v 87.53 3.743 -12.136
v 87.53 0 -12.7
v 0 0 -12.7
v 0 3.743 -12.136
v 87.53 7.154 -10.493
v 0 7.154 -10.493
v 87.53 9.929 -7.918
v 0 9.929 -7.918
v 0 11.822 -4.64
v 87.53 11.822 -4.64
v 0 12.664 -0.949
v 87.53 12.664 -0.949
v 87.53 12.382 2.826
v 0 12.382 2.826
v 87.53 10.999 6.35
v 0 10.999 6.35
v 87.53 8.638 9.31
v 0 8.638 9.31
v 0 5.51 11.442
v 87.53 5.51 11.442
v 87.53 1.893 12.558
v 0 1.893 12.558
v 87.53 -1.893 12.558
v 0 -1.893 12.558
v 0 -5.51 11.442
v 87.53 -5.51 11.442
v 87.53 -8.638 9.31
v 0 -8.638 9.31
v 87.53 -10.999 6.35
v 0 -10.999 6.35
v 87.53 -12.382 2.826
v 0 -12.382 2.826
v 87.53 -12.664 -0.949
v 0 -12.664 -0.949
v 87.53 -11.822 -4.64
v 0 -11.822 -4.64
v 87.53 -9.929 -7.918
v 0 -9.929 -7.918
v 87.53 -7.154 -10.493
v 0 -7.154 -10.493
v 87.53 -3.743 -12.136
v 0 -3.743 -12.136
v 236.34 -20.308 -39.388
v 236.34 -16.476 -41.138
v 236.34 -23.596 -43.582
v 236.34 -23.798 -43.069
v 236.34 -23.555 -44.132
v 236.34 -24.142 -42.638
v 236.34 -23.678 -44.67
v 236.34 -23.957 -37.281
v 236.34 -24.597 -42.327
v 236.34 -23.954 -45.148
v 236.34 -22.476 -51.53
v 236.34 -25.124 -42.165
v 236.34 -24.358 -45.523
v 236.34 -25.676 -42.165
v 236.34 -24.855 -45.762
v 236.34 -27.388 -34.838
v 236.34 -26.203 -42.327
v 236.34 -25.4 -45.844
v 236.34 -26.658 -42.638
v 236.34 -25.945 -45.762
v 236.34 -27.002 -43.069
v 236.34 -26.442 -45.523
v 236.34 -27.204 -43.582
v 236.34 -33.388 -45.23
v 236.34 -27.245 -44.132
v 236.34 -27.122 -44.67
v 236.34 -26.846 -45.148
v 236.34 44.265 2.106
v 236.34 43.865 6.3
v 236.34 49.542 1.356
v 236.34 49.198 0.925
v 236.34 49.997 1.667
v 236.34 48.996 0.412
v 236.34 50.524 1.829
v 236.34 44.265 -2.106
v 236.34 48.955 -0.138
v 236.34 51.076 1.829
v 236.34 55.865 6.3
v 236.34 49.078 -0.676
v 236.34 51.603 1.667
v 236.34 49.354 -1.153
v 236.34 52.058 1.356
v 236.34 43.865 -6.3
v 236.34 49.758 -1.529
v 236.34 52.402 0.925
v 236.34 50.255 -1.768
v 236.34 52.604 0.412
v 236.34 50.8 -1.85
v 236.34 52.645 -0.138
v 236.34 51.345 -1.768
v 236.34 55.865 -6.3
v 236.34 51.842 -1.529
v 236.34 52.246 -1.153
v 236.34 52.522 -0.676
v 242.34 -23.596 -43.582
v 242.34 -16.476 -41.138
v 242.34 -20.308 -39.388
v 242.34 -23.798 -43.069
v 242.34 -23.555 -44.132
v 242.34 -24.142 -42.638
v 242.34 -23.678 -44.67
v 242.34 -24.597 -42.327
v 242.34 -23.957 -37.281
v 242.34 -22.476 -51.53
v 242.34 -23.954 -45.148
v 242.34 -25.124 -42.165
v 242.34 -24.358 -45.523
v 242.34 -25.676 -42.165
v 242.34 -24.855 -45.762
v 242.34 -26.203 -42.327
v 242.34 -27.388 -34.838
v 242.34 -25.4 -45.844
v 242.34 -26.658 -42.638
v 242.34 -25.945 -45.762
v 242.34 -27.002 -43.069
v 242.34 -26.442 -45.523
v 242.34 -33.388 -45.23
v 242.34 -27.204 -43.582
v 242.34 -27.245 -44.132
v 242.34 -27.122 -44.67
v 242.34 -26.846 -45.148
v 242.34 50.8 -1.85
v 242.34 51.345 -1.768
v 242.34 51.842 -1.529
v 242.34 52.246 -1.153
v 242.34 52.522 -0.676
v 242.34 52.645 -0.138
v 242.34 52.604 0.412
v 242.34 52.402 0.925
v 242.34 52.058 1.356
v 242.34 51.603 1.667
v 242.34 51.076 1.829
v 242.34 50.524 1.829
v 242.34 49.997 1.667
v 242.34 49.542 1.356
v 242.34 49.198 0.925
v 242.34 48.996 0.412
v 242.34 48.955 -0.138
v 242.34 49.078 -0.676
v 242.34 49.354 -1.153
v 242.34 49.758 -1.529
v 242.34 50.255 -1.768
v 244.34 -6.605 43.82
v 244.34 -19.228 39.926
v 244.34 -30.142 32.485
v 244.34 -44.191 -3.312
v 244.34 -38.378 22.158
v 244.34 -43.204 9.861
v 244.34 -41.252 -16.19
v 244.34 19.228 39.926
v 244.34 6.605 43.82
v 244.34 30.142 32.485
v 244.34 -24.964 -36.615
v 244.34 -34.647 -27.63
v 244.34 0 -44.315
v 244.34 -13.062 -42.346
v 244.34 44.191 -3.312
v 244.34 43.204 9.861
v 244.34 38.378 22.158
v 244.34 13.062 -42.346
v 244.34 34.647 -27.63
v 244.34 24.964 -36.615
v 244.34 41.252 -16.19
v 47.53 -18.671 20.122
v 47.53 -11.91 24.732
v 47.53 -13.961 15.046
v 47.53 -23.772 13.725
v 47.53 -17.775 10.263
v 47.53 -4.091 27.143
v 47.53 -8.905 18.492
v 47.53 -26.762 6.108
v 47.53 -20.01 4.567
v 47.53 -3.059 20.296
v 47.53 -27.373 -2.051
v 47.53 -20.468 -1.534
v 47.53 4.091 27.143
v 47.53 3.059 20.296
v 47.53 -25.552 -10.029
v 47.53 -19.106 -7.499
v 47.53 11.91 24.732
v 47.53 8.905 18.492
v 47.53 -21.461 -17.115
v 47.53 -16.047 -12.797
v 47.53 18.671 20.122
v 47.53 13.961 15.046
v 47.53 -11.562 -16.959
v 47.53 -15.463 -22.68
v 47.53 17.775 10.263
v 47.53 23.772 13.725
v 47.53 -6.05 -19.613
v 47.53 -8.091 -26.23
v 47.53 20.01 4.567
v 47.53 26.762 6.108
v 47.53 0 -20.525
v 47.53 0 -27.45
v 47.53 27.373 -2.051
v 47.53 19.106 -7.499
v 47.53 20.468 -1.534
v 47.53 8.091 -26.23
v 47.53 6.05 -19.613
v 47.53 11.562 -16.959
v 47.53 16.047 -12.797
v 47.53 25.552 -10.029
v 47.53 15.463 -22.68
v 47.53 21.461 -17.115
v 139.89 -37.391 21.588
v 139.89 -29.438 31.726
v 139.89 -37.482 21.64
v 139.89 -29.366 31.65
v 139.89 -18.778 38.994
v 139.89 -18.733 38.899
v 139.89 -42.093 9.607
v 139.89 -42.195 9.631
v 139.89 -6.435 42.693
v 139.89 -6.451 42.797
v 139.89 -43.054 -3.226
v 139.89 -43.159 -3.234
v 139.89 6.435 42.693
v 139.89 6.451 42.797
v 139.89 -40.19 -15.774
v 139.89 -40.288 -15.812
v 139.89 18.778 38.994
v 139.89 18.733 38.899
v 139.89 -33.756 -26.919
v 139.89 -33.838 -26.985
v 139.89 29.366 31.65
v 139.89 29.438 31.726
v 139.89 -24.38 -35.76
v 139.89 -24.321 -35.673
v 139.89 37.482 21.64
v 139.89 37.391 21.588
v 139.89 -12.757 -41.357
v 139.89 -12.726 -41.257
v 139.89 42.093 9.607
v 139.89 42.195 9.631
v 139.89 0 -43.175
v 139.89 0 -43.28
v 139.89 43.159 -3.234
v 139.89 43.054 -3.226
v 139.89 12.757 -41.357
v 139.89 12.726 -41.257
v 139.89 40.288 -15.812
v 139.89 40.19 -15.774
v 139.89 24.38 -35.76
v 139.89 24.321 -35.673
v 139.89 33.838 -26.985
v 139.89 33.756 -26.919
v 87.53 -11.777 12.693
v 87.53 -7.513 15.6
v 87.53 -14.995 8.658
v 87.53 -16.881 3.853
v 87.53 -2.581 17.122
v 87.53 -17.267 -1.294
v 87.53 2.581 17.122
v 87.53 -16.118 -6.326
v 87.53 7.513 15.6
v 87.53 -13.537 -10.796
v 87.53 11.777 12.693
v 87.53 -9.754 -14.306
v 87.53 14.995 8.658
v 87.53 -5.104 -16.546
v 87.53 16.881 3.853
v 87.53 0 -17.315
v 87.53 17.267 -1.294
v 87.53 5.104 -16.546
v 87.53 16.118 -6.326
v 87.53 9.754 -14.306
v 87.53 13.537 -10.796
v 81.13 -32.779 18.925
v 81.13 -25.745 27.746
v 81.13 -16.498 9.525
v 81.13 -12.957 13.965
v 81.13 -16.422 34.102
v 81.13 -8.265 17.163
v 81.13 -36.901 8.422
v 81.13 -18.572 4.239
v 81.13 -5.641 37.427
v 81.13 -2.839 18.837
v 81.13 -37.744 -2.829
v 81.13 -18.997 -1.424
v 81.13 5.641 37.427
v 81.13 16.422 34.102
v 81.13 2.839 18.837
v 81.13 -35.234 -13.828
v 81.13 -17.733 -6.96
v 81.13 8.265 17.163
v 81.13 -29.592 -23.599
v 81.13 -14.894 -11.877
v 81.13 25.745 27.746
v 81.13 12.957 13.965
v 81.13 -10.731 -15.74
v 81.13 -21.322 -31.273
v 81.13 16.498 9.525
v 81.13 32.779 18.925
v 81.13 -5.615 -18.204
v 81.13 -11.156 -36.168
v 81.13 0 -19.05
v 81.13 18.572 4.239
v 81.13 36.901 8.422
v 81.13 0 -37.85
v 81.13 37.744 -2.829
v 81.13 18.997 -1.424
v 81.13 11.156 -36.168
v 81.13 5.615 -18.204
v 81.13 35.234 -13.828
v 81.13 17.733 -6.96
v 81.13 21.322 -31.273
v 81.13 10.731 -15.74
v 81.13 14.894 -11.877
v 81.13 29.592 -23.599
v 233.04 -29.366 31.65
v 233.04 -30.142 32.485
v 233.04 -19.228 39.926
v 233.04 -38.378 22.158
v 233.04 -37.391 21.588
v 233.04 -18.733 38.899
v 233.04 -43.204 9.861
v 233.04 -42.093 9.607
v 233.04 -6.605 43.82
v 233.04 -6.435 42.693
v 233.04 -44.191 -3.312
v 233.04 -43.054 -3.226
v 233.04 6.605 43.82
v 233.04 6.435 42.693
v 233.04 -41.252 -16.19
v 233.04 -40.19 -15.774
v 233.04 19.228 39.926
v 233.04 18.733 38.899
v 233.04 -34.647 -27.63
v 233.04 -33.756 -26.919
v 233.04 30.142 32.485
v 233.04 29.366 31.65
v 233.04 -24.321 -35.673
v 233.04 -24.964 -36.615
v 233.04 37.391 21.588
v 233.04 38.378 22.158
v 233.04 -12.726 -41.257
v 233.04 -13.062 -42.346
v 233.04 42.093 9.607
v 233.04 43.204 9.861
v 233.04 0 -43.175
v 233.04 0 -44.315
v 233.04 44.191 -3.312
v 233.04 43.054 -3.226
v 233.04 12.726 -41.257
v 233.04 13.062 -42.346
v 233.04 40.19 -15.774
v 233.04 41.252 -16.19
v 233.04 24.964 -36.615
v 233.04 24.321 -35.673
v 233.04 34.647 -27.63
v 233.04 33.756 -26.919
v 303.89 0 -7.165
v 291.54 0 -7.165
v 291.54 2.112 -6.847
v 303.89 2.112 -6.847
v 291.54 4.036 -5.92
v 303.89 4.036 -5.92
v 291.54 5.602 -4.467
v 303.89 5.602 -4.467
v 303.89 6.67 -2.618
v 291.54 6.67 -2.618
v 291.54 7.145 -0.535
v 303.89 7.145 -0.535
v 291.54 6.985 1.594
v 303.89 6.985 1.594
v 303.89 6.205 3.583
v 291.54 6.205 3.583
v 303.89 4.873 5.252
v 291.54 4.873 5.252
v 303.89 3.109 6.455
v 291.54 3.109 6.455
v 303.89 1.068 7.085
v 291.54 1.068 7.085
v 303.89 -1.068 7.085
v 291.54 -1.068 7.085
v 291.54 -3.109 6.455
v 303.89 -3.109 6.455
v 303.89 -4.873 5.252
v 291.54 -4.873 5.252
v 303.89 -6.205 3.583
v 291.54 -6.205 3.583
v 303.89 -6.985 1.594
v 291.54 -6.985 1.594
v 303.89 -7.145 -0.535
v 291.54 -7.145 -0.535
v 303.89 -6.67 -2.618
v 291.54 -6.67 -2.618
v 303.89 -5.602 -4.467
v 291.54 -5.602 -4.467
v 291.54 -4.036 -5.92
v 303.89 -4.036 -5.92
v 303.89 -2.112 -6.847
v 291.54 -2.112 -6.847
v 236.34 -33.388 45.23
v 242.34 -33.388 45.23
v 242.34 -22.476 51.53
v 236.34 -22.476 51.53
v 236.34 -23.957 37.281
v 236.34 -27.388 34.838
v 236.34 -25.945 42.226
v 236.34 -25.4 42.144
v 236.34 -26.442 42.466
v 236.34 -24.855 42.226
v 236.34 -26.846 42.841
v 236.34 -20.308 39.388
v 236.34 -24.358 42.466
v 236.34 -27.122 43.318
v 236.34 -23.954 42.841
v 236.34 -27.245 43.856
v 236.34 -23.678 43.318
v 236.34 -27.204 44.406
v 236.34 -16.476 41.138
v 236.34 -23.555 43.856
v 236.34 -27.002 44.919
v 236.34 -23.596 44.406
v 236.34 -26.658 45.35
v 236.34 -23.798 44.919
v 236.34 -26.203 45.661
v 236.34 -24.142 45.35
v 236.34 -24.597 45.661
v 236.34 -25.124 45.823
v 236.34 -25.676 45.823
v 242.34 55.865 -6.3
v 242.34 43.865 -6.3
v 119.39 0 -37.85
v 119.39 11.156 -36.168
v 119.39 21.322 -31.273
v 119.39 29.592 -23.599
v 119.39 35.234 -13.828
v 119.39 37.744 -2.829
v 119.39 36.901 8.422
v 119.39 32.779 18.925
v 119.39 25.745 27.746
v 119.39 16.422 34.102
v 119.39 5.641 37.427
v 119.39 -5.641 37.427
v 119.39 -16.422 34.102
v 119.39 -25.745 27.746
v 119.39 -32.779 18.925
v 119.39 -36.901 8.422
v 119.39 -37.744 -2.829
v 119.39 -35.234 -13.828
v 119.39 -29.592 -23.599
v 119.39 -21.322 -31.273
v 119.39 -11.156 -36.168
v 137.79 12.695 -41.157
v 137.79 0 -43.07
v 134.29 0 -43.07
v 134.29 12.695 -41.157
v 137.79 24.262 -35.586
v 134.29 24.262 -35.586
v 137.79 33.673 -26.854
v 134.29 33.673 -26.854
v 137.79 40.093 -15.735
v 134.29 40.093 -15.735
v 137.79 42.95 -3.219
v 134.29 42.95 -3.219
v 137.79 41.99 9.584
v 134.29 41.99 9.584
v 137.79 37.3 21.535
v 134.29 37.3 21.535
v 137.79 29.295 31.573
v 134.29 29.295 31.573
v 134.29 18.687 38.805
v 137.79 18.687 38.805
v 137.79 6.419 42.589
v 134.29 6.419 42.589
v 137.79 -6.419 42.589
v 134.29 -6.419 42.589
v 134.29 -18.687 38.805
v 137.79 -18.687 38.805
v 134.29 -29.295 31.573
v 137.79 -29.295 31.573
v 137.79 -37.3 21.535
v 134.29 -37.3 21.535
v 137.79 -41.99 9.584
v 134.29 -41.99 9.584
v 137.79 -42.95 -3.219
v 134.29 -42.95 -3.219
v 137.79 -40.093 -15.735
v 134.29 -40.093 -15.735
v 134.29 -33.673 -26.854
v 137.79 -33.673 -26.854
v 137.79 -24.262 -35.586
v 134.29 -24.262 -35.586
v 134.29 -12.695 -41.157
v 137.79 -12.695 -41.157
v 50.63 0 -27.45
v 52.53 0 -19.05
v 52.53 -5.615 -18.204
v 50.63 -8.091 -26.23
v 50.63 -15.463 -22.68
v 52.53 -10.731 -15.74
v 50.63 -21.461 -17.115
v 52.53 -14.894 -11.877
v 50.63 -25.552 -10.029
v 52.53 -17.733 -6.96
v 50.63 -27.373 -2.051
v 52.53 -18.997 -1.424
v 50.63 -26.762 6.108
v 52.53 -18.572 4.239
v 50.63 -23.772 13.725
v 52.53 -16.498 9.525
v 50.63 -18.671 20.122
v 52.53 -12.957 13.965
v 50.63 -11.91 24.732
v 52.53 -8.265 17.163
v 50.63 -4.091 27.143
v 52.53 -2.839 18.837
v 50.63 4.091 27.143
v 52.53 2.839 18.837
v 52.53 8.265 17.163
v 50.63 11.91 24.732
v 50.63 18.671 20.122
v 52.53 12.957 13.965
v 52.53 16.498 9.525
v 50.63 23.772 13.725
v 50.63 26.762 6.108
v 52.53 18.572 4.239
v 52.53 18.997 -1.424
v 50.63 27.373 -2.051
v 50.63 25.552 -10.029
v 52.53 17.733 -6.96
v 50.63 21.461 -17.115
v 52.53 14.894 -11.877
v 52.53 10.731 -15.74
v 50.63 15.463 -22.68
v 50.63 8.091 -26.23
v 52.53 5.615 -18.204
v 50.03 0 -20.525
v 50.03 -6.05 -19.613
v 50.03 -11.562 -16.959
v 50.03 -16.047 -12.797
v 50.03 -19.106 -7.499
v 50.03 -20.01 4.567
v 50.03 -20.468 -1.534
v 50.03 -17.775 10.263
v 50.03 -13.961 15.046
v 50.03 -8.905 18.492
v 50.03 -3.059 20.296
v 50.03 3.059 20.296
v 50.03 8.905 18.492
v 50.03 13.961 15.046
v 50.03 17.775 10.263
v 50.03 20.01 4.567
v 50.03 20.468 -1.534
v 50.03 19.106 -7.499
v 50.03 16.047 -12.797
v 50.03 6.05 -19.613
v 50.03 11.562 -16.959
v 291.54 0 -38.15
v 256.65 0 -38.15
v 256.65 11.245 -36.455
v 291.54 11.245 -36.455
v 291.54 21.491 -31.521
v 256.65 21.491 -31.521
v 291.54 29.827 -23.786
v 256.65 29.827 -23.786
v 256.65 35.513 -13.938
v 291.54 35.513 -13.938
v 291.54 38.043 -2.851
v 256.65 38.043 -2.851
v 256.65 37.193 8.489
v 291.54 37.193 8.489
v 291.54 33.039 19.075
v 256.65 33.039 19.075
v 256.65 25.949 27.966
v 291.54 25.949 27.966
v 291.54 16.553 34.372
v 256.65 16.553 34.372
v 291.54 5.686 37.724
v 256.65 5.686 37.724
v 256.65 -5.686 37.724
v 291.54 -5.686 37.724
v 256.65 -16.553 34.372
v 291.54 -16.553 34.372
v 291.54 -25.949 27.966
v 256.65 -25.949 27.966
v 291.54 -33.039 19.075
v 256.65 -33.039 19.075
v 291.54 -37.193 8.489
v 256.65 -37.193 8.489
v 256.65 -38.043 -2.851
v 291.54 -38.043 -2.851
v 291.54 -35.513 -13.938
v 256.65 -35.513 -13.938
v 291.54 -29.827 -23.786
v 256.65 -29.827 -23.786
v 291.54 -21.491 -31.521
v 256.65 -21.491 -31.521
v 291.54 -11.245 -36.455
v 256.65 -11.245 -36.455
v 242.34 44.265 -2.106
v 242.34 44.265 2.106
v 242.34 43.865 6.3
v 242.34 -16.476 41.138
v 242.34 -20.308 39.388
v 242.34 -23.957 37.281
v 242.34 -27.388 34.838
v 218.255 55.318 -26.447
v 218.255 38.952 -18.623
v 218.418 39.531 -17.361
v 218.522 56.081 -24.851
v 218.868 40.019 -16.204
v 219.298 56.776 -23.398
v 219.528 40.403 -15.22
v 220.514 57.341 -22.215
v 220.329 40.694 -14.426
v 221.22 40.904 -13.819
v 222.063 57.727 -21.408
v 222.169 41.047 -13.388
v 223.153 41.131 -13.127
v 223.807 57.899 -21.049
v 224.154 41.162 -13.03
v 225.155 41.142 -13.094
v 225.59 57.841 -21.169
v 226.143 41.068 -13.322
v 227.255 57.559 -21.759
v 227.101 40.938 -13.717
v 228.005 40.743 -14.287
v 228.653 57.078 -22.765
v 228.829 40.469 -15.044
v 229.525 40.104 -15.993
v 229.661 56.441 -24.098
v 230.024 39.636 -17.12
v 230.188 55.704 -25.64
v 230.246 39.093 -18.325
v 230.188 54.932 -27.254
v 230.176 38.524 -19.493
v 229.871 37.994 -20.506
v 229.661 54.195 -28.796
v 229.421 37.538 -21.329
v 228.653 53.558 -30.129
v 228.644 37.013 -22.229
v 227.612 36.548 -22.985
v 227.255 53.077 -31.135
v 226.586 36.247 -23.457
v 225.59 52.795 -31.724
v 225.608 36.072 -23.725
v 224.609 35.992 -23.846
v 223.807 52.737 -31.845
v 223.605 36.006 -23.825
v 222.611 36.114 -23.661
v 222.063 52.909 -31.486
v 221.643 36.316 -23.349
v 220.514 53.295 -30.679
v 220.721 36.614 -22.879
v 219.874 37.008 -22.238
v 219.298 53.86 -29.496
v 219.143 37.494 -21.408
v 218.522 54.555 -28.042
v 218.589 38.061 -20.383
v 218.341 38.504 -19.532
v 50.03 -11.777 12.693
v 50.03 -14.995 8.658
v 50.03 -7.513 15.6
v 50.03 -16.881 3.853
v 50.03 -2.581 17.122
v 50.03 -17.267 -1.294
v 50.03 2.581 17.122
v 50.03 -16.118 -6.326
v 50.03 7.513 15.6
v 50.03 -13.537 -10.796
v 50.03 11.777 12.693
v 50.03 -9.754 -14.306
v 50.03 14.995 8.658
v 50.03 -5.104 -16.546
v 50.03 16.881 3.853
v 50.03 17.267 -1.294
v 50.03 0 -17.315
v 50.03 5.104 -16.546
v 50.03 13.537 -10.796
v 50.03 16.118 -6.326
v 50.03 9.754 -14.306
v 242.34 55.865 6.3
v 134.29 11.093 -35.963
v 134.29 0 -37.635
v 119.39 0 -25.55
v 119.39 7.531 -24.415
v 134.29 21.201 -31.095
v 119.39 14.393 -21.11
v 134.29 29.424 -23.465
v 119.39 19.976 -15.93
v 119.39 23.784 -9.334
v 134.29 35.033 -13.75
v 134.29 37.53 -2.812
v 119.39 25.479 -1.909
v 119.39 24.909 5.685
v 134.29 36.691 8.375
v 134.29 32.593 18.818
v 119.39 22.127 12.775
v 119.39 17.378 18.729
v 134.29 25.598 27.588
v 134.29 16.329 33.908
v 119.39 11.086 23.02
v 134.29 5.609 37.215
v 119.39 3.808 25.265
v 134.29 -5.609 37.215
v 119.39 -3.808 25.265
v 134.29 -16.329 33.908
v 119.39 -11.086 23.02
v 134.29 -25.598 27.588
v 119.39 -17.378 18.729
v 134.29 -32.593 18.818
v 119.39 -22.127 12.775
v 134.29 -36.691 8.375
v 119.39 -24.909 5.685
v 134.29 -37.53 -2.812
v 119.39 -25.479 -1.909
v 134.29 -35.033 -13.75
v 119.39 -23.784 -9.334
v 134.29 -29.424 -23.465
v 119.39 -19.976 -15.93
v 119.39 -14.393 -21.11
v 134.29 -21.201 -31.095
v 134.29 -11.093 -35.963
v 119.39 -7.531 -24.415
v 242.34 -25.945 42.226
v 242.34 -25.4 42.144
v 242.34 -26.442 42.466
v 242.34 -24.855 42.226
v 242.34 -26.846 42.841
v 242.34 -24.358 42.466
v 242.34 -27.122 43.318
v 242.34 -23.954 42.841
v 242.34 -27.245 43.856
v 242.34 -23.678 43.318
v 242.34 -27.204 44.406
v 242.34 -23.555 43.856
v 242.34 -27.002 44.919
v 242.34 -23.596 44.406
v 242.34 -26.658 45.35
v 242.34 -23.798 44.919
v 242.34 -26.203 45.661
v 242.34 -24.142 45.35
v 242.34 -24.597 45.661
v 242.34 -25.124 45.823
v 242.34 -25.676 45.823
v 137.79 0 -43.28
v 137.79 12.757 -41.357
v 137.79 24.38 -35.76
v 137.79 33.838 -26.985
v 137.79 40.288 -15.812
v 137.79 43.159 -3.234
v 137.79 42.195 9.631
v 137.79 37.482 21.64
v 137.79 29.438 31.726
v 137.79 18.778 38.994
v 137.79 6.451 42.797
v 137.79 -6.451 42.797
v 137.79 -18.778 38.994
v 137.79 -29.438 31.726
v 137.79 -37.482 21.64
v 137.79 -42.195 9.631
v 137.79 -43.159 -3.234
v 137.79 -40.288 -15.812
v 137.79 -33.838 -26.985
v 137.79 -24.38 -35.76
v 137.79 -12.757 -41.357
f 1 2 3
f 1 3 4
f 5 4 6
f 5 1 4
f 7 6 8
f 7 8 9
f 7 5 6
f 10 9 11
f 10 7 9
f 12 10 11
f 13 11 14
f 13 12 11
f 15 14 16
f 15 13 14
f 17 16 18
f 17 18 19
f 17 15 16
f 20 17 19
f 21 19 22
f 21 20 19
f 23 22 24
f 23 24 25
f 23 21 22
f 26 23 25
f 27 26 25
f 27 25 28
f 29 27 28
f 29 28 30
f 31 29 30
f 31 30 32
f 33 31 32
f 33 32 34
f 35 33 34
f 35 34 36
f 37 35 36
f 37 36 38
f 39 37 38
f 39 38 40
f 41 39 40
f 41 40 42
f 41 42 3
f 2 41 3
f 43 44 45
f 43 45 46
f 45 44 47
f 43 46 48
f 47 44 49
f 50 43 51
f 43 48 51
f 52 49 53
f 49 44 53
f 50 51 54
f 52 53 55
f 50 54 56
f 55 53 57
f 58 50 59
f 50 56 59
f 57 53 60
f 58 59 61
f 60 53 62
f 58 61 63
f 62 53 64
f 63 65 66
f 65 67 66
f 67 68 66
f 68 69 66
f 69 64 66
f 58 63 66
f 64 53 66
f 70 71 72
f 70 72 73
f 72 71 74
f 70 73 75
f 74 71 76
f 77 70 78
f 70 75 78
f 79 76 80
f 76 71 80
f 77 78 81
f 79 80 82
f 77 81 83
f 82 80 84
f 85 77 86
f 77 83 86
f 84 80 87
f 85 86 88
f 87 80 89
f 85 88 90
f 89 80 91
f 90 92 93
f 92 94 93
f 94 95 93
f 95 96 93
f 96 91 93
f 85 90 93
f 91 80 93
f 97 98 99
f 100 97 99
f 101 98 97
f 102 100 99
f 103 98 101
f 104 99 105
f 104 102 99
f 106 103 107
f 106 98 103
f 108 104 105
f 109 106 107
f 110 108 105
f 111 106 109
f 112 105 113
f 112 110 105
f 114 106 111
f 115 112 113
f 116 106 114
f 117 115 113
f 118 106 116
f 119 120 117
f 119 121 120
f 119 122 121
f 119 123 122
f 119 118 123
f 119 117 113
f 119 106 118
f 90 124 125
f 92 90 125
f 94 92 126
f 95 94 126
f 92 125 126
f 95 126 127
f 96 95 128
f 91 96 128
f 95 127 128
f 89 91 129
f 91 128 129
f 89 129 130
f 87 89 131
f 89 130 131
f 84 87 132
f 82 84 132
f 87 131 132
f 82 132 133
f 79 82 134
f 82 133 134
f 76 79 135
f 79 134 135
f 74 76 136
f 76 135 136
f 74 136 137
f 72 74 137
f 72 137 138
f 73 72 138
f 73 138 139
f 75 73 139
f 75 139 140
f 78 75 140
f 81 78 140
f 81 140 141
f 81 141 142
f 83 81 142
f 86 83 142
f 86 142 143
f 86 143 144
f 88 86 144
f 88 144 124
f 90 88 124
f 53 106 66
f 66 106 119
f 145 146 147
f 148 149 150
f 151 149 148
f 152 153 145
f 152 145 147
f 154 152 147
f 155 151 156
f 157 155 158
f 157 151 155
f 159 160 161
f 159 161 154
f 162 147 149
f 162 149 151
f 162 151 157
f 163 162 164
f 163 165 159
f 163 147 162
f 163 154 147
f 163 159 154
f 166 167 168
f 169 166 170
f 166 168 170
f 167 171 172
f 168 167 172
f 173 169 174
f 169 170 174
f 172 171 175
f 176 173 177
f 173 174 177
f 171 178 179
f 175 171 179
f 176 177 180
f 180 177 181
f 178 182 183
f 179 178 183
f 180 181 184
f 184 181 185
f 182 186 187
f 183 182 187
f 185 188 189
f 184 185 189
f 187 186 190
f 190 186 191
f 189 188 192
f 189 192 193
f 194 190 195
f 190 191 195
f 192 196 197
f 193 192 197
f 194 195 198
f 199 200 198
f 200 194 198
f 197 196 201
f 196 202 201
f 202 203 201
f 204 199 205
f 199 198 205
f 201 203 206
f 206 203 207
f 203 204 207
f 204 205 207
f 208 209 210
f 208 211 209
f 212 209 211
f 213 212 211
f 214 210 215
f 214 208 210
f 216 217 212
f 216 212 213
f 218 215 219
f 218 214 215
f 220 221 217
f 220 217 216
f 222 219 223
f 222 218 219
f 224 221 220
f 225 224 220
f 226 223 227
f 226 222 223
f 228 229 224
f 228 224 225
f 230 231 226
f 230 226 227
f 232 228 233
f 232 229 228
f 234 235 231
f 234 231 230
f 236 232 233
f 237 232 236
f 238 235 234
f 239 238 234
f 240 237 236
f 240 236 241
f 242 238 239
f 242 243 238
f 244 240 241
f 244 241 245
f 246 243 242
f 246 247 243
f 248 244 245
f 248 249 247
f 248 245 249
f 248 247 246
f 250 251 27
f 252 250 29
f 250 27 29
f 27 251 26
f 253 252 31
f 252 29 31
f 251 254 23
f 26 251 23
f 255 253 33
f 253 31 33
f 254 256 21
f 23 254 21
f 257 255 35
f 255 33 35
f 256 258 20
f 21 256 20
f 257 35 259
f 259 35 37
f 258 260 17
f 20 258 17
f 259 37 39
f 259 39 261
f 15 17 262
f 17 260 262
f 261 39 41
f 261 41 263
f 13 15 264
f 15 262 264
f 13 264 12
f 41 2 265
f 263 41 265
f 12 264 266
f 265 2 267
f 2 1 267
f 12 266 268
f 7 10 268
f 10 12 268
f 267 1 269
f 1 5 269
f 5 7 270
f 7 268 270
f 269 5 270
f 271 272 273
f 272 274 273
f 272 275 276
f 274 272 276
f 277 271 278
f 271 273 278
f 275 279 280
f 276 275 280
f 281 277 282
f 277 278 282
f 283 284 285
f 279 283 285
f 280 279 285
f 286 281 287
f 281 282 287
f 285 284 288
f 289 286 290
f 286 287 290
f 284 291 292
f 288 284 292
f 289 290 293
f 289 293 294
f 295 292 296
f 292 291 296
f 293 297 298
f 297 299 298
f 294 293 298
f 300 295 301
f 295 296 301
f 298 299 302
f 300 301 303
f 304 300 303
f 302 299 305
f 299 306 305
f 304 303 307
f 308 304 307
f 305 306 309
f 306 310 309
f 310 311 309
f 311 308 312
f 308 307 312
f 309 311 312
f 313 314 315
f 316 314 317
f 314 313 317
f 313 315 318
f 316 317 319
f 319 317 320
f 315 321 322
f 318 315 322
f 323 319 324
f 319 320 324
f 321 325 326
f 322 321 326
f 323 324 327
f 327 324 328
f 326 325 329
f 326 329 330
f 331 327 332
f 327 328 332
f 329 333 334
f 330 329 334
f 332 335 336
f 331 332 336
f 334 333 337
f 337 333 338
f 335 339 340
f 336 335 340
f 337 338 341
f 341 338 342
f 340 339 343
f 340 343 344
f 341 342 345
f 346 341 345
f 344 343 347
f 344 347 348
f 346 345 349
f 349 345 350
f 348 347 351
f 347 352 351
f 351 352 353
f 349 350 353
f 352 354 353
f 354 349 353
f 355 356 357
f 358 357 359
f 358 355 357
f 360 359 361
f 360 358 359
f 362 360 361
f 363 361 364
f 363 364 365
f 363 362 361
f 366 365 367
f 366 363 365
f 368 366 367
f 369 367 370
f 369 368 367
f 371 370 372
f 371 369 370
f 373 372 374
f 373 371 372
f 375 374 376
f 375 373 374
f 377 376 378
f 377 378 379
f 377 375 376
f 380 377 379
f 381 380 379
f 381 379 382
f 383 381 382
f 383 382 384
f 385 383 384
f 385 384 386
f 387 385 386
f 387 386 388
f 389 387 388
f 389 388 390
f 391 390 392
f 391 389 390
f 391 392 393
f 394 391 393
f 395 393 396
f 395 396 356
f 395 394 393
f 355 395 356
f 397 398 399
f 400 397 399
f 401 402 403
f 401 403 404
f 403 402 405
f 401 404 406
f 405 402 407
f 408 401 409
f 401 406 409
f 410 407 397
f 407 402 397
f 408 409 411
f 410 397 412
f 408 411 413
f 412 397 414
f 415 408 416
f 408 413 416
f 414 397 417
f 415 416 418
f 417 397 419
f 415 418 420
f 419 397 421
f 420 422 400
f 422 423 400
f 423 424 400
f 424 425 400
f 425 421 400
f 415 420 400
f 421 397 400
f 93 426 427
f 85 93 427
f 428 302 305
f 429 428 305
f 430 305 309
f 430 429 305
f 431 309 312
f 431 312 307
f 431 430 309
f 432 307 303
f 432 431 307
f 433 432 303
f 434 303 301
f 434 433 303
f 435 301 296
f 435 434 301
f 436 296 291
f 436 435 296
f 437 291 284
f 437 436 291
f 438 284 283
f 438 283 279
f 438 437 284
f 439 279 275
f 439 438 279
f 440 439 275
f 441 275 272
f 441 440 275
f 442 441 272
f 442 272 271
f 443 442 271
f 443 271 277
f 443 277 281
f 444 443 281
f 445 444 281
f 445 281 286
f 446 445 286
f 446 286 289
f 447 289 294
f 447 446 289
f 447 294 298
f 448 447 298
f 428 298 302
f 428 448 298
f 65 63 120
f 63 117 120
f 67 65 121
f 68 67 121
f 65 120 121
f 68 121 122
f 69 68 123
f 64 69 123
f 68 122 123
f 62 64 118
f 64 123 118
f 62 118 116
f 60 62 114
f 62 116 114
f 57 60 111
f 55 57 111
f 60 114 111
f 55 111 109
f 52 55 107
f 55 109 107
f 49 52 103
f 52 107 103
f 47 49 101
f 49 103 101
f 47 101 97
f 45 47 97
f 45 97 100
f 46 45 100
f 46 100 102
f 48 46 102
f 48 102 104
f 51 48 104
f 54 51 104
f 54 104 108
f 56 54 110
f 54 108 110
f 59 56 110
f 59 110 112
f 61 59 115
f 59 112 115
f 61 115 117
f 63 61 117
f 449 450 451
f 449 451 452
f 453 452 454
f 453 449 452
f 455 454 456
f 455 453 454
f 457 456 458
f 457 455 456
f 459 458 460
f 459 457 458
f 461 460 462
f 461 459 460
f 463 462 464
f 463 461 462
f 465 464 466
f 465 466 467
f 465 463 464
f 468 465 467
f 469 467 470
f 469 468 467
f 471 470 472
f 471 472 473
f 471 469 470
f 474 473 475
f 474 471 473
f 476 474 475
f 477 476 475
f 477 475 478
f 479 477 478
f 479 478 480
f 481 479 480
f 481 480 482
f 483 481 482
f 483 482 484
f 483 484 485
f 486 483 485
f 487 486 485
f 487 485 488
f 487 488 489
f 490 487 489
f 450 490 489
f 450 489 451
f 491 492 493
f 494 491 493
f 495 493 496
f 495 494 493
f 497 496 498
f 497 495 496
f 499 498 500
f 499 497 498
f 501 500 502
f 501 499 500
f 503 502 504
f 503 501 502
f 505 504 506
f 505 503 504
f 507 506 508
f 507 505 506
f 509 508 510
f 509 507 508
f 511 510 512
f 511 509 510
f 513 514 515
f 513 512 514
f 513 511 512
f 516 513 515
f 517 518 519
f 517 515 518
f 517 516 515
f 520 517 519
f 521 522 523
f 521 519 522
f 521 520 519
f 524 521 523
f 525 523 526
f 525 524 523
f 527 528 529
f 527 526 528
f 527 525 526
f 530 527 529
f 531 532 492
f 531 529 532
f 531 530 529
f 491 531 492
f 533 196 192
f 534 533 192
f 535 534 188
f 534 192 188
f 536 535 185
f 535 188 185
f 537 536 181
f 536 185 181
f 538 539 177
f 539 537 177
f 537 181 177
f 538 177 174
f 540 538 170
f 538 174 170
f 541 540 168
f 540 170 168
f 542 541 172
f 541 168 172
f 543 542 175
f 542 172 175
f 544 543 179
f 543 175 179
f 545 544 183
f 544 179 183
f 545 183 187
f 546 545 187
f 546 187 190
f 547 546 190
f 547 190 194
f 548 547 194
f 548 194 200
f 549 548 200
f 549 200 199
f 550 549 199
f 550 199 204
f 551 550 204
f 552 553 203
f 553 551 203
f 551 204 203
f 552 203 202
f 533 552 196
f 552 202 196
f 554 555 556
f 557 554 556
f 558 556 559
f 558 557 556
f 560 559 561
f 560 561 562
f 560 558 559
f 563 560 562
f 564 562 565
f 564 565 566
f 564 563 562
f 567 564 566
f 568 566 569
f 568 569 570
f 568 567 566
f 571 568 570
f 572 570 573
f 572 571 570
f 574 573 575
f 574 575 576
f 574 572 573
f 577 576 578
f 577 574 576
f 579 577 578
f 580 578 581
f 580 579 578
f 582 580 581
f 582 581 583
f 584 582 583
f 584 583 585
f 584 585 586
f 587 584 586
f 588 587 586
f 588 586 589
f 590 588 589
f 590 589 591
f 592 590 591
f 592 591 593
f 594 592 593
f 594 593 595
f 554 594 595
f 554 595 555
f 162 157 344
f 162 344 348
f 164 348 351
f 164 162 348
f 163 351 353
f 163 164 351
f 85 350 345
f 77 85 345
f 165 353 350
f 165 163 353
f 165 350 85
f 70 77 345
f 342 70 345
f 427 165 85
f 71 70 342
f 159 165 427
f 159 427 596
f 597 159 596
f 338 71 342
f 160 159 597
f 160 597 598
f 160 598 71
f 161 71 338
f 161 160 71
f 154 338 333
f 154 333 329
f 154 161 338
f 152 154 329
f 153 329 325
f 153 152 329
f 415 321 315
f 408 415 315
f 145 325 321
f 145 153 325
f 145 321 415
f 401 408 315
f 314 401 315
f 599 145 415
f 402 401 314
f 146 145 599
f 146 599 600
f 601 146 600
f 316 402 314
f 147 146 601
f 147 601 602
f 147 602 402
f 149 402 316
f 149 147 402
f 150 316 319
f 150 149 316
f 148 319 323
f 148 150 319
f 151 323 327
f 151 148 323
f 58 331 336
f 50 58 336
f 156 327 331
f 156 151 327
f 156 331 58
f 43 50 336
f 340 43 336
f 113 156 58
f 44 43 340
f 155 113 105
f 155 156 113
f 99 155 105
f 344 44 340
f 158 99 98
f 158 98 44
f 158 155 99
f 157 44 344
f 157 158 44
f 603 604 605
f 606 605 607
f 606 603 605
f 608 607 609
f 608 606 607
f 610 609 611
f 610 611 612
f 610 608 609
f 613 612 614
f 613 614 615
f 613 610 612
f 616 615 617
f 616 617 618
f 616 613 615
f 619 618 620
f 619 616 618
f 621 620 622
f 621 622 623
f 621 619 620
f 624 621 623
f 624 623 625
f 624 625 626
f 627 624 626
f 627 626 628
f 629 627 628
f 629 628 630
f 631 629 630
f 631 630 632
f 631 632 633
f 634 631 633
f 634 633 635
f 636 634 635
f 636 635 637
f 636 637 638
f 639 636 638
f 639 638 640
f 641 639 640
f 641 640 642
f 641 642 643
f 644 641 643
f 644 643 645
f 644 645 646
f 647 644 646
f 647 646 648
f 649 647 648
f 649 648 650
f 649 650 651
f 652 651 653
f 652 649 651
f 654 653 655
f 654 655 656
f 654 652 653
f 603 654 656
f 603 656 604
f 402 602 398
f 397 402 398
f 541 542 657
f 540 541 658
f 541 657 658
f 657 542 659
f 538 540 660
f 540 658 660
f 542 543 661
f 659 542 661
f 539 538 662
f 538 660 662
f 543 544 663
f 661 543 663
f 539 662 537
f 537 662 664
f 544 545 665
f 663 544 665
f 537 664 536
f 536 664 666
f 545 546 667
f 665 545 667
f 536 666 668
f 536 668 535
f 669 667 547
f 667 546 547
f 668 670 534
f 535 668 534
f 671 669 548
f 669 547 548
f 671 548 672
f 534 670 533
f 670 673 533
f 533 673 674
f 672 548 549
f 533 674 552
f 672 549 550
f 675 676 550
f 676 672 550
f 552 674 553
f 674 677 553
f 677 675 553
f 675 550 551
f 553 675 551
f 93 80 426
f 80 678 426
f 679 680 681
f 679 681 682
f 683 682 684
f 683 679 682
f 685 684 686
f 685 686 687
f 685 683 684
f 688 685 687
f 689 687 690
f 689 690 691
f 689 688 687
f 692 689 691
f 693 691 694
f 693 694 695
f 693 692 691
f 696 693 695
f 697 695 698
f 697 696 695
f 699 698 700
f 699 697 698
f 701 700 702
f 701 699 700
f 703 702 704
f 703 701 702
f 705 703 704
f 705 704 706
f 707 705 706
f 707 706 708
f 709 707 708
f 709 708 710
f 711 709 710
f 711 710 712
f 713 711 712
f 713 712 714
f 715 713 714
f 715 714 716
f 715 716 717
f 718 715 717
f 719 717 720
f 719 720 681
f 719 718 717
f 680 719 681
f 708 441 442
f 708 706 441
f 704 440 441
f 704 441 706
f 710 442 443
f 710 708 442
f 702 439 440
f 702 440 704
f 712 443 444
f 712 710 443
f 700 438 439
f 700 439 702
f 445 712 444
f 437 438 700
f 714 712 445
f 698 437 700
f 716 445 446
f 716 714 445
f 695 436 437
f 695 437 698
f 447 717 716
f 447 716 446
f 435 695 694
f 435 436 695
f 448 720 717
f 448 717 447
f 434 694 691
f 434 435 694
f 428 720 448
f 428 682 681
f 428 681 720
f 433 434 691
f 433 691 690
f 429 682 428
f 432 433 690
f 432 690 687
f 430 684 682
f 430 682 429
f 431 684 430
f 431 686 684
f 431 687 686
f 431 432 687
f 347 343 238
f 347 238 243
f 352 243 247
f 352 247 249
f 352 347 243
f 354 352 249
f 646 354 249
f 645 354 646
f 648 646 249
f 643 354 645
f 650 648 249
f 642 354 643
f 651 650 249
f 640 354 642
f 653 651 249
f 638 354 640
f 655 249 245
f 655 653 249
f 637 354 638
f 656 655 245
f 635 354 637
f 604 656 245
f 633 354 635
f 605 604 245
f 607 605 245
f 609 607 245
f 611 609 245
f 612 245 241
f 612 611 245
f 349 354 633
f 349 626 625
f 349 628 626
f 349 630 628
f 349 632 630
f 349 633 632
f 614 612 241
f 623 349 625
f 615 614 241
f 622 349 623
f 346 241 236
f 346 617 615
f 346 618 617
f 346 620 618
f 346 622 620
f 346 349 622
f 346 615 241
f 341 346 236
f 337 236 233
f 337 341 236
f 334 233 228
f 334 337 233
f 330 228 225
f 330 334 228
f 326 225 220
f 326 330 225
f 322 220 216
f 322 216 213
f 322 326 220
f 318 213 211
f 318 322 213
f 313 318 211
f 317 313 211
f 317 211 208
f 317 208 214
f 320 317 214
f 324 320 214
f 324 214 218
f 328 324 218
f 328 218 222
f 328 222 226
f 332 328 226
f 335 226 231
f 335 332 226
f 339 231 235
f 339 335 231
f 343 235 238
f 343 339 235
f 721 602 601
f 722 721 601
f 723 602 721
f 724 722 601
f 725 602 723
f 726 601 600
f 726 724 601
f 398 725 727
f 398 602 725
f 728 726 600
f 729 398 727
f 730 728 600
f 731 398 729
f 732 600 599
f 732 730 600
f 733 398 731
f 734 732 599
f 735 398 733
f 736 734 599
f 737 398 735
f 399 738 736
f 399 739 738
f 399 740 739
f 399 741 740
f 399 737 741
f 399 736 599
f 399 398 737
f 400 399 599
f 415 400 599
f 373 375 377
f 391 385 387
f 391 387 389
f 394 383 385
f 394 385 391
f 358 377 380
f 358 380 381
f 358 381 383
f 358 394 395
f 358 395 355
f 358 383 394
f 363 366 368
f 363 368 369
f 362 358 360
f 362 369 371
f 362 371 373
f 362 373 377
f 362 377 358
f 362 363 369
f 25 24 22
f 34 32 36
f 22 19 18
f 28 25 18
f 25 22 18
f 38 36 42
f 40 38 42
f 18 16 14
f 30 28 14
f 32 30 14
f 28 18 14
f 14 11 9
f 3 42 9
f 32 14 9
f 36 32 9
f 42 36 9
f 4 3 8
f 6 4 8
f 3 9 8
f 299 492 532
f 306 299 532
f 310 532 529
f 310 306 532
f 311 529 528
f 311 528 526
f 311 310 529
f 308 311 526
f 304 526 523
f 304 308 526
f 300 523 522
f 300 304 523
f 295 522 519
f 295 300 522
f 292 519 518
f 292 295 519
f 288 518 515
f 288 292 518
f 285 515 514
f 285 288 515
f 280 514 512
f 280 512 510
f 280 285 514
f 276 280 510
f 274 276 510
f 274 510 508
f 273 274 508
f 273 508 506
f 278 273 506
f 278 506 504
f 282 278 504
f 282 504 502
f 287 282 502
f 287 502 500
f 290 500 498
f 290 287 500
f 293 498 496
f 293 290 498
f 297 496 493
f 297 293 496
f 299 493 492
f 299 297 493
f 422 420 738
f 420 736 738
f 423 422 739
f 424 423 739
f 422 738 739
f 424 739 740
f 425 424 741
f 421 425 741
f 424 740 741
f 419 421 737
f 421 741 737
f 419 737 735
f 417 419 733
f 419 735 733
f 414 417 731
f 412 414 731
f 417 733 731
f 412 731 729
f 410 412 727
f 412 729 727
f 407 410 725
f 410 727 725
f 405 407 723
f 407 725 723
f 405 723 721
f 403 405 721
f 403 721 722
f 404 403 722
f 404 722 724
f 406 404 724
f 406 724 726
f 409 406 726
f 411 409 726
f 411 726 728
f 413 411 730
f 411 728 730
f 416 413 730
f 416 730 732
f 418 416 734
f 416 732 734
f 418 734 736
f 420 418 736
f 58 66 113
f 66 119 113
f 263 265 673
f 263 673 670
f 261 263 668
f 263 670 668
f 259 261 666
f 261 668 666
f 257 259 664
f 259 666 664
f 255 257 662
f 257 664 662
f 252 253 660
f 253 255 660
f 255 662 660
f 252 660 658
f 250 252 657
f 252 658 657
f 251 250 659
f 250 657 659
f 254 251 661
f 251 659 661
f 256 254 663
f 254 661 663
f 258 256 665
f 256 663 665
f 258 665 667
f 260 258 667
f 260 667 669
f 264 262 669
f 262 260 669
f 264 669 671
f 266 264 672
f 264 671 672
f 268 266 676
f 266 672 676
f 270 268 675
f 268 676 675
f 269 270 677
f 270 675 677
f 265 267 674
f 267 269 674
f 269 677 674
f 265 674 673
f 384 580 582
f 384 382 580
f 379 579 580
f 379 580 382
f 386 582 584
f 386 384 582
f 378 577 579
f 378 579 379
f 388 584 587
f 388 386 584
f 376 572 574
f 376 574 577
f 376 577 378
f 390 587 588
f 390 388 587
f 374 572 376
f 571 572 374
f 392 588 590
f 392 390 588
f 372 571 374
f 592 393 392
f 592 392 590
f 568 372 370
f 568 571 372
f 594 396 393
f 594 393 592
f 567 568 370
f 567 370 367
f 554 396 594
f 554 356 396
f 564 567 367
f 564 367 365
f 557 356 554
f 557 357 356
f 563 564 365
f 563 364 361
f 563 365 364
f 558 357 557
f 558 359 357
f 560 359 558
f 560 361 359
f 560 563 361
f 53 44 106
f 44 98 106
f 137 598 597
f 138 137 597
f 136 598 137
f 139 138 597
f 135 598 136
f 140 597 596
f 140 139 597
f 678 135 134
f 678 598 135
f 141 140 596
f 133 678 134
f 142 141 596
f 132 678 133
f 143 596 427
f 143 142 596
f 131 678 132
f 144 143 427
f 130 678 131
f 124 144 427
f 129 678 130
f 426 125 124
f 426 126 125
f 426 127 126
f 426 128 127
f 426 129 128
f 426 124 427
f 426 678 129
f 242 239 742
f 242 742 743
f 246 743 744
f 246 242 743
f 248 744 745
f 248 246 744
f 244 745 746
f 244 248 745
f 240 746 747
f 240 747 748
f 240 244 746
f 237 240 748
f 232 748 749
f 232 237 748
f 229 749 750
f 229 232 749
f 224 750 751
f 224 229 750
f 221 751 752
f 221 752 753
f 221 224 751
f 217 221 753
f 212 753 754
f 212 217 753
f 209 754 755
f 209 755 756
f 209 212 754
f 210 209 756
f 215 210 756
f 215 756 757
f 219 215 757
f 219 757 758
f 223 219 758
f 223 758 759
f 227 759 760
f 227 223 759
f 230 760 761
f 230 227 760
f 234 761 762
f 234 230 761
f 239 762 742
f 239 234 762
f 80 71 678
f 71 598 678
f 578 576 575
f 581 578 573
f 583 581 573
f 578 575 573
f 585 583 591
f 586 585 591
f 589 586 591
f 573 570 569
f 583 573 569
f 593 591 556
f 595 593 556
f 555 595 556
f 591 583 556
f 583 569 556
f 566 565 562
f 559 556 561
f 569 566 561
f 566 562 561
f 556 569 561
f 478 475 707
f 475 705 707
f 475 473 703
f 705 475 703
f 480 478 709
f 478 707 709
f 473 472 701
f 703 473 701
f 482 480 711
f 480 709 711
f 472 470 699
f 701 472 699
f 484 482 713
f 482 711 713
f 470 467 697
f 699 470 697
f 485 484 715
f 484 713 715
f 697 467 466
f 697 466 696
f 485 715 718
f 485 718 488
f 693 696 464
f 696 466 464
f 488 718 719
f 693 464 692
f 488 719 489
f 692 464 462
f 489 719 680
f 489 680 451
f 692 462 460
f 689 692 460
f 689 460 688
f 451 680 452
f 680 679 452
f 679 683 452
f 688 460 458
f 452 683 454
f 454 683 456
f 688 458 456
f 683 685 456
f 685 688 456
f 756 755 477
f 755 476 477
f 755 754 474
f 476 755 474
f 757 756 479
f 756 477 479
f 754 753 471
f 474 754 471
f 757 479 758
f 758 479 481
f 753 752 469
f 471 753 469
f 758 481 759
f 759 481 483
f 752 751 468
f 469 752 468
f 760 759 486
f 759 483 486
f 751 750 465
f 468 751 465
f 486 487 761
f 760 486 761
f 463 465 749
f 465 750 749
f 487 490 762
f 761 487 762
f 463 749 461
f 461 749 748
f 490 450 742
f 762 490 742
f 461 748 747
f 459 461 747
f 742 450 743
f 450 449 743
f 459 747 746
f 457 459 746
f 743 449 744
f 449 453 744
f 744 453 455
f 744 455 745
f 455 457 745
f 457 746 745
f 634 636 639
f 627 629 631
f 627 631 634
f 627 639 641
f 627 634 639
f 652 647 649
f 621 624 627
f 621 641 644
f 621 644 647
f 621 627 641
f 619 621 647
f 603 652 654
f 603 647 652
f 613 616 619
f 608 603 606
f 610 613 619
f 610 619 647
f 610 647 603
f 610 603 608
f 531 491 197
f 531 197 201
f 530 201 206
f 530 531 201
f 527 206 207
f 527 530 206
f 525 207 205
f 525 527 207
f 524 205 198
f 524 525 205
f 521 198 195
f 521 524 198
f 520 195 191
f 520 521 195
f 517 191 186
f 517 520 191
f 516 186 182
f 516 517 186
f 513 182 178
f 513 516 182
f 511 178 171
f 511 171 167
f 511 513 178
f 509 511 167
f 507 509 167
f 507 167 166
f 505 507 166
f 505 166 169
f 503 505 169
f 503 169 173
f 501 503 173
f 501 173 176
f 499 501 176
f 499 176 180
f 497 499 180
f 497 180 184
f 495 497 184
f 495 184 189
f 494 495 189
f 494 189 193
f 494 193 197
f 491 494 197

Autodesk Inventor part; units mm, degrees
ref_plane "YZ Plane" through (0, 0, 0) normal (1, 0, 0) x (0, 1, 0)
sketch "Sketch1" plane through (0, 0, 0) normal (0, 1, 0) x (-1, 0, 0)
  line L0 (0, 0) -> (-303.89, 0)
  line L1 (0, 0) -> (0, -12.7)
  line L2 (0, -12.7) -> (-87.53, -12.7)
  line L3 (-87.53, -12.7) -> (-87.53, -17.315)
  line L4 (-87.53, -17.315) -> (-50.03, -17.315)
  line L5 (-50.03, -17.315) -> (-50.03, -20.525)
  line L6 (-50.03, -20.525) -> (-47.53, -20.525)
  line L7 (-47.53, -20.525) -> (-47.53, -27.45)
  line L8 (-47.53, -27.45) -> (-50.63, -27.45)
  line L9 (-50.63, -27.45) -> (-52.53, -19.05)
  line L10 (-52.53, -19.05) -> (-81.13, -19.05)
  line L11 (-81.13, -19.05) -> (-81.13, -37.85)
  line L12 (-81.13, -37.85) -> (-119.39, -37.85)
  line L13 (-119.39, -37.85) -> (-119.39, -25.55)
  line L14 (-119.39, -25.55) -> (-134.29, -37.635)
  line L15 (-134.29, -37.635) -> (-134.29, -43.07)
  line L16 (-134.29, -43.07) -> (-137.79, -43.07)
  line L17 (-137.79, -43.07) -> (-137.79, -43.28)
  line L18 (-137.79, -43.28) -> (-139.89, -43.28)
  line L19 (-139.89, -43.28) -> (-139.89, -43.175)
  line L20 (-139.89, -43.175) -> (-233.04, -43.175)
  line L21 (-233.04, -43.175) -> (-233.04, -44.315)
  line L22 (-233.04, -44.315) -> (-244.34, -44.315)
  line L23 (-244.34, -44.315) -> (-244.34, 0)
  line L24 (-256.65, 0) -> (-256.65, -38.15)
  line L25 (-256.65, -38.15) -> (-291.54, -38.15)
  line L26 (-291.54, -38.15) -> (-291.54, -7.165)
  line L27 (-291.54, -7.165) -> (-303.89, -7.165)
  line L28 (-303.89, -7.165) -> (-303.89, 0)
  dimension "d0" = 303.89
  dimension "d1" = 12.7
  dimension "d2" = 87.53
  dimension "d3" = 4.615
  dimension "d4" = 37.5
  dimension "d5" = 3.21
  dimension "d6" = 2.5
  dimension "d7" = 27.45
  dimension "d8" = 3.1
  dimension "d9" = 5
  dimension "d10" = 19.05
  dimension "d11" = 30.5
  dimension "d12" = 37.85
  dimension "d13" = 38.26
  dimension "d14" = 12.3
  dimension "d16" = 14.9
  dimension "d17" = 37.635
  dimension "d18" = 43.07
  dimension "d19" = 3.5
  dimension "d20" = 43.28
  dimension "d21" = 2.1
  dimension "d22" = 43.175
  dimension "d23" = 98.75
  dimension "d24" = 44.315
  dimension "d25" = 110.05
  dimension "d26" = 12.31
  dimension "d27" = 157.25
  dimension "d28" = 38.15
  dimension "d29" = 90
  dimension "d30" = 7.165
  dimension "d31" = 12.35
revolve "Revolution1" add sketch "Sketch1" angle 360 about axis through (0, 0, 0) along (1, 0, 0)
ref_plane "Work Plane1" through (242.34, 0, 0) normal (1, 0, 0) x (0, 0, -1)
sketch "Sketch3" plane through (242.34, 0, 0) normal (1, 0, 0) x (0, 0, -1)
  circle A0 centre (0, 0) radius 44.315 projected
  line L0 (-6.3, 55.8649) -> (6.3, 55.8649)
  line L1 (6.3, 55.8649) -> (6.3, 43.8649)
  line L2 (6.3, 43.8649) -> (-6.3, 43.8649)
  line L3 (-6.3, 43.8649) -> (-6.3, 55.8649)
  circle A1 centre (0, 50.8) radius 1.85
  line L4 (-6.3, 44.315) -> (6.3, 44.315) construction
  line L5 (124.271, 70.9929) -> (36.131, 70.9929)
  line L6 (36.131, 70.9929) -> (80.201, 147.3244)
  line L7 (80.201, 147.3244) -> (124.271, 70.9929)
  circle A2 centre (80.201, 96.4367) radius 50.8877
  circle A3 centre (0, 0) radius 50.8 construction
  point P0 (0, 55.8649)
  point P1 (0, 44.315)
  point P2 (19.1143, 39.9808)
  dimension "d51" = 101.7753
  dimension "d53" = 101.6
  dimension "d35" = 12.6
  dimension "d36" = 12
  dimension "d37" = 3.7
  dimension "d45" = 13.39
  dimension "d50" = 88.14
extrude "Extrusion1" add sketch "Sketch3" against normal blind 6 contours A0 L3 L0 L1
pattern_circular "Circular Pattern1" count 3 over 360 about axis through (-10, 0, 0) along (1, 0, 0) of "Extrusion1"
ref_plane "Work Plane2" through (242.34, 39.9808, -19.1143) normal (0, 0.9021954, -0.4313276) x (-1, 0, 0)
sketch "Sketch5" plane through (242.34, 39.9808, -19.1143) normal (0, 0.9021954, -0.4313276) x (-1, 0, 0)
  circle A0 centre (18.085, 0) radius 6
  line L0 (-2, 44.315) -> (-2, -44.315) projected
  point P0 (242.34, 0)
  point P1 (0, 0)
  dimension "d46" = 12
  dimension "d47" = 20.085
extrude "Extrusion2" add sketch "Sketch5" along normal mid plane 34
properties part number "STI Hybrid 98 Cryocooler"
